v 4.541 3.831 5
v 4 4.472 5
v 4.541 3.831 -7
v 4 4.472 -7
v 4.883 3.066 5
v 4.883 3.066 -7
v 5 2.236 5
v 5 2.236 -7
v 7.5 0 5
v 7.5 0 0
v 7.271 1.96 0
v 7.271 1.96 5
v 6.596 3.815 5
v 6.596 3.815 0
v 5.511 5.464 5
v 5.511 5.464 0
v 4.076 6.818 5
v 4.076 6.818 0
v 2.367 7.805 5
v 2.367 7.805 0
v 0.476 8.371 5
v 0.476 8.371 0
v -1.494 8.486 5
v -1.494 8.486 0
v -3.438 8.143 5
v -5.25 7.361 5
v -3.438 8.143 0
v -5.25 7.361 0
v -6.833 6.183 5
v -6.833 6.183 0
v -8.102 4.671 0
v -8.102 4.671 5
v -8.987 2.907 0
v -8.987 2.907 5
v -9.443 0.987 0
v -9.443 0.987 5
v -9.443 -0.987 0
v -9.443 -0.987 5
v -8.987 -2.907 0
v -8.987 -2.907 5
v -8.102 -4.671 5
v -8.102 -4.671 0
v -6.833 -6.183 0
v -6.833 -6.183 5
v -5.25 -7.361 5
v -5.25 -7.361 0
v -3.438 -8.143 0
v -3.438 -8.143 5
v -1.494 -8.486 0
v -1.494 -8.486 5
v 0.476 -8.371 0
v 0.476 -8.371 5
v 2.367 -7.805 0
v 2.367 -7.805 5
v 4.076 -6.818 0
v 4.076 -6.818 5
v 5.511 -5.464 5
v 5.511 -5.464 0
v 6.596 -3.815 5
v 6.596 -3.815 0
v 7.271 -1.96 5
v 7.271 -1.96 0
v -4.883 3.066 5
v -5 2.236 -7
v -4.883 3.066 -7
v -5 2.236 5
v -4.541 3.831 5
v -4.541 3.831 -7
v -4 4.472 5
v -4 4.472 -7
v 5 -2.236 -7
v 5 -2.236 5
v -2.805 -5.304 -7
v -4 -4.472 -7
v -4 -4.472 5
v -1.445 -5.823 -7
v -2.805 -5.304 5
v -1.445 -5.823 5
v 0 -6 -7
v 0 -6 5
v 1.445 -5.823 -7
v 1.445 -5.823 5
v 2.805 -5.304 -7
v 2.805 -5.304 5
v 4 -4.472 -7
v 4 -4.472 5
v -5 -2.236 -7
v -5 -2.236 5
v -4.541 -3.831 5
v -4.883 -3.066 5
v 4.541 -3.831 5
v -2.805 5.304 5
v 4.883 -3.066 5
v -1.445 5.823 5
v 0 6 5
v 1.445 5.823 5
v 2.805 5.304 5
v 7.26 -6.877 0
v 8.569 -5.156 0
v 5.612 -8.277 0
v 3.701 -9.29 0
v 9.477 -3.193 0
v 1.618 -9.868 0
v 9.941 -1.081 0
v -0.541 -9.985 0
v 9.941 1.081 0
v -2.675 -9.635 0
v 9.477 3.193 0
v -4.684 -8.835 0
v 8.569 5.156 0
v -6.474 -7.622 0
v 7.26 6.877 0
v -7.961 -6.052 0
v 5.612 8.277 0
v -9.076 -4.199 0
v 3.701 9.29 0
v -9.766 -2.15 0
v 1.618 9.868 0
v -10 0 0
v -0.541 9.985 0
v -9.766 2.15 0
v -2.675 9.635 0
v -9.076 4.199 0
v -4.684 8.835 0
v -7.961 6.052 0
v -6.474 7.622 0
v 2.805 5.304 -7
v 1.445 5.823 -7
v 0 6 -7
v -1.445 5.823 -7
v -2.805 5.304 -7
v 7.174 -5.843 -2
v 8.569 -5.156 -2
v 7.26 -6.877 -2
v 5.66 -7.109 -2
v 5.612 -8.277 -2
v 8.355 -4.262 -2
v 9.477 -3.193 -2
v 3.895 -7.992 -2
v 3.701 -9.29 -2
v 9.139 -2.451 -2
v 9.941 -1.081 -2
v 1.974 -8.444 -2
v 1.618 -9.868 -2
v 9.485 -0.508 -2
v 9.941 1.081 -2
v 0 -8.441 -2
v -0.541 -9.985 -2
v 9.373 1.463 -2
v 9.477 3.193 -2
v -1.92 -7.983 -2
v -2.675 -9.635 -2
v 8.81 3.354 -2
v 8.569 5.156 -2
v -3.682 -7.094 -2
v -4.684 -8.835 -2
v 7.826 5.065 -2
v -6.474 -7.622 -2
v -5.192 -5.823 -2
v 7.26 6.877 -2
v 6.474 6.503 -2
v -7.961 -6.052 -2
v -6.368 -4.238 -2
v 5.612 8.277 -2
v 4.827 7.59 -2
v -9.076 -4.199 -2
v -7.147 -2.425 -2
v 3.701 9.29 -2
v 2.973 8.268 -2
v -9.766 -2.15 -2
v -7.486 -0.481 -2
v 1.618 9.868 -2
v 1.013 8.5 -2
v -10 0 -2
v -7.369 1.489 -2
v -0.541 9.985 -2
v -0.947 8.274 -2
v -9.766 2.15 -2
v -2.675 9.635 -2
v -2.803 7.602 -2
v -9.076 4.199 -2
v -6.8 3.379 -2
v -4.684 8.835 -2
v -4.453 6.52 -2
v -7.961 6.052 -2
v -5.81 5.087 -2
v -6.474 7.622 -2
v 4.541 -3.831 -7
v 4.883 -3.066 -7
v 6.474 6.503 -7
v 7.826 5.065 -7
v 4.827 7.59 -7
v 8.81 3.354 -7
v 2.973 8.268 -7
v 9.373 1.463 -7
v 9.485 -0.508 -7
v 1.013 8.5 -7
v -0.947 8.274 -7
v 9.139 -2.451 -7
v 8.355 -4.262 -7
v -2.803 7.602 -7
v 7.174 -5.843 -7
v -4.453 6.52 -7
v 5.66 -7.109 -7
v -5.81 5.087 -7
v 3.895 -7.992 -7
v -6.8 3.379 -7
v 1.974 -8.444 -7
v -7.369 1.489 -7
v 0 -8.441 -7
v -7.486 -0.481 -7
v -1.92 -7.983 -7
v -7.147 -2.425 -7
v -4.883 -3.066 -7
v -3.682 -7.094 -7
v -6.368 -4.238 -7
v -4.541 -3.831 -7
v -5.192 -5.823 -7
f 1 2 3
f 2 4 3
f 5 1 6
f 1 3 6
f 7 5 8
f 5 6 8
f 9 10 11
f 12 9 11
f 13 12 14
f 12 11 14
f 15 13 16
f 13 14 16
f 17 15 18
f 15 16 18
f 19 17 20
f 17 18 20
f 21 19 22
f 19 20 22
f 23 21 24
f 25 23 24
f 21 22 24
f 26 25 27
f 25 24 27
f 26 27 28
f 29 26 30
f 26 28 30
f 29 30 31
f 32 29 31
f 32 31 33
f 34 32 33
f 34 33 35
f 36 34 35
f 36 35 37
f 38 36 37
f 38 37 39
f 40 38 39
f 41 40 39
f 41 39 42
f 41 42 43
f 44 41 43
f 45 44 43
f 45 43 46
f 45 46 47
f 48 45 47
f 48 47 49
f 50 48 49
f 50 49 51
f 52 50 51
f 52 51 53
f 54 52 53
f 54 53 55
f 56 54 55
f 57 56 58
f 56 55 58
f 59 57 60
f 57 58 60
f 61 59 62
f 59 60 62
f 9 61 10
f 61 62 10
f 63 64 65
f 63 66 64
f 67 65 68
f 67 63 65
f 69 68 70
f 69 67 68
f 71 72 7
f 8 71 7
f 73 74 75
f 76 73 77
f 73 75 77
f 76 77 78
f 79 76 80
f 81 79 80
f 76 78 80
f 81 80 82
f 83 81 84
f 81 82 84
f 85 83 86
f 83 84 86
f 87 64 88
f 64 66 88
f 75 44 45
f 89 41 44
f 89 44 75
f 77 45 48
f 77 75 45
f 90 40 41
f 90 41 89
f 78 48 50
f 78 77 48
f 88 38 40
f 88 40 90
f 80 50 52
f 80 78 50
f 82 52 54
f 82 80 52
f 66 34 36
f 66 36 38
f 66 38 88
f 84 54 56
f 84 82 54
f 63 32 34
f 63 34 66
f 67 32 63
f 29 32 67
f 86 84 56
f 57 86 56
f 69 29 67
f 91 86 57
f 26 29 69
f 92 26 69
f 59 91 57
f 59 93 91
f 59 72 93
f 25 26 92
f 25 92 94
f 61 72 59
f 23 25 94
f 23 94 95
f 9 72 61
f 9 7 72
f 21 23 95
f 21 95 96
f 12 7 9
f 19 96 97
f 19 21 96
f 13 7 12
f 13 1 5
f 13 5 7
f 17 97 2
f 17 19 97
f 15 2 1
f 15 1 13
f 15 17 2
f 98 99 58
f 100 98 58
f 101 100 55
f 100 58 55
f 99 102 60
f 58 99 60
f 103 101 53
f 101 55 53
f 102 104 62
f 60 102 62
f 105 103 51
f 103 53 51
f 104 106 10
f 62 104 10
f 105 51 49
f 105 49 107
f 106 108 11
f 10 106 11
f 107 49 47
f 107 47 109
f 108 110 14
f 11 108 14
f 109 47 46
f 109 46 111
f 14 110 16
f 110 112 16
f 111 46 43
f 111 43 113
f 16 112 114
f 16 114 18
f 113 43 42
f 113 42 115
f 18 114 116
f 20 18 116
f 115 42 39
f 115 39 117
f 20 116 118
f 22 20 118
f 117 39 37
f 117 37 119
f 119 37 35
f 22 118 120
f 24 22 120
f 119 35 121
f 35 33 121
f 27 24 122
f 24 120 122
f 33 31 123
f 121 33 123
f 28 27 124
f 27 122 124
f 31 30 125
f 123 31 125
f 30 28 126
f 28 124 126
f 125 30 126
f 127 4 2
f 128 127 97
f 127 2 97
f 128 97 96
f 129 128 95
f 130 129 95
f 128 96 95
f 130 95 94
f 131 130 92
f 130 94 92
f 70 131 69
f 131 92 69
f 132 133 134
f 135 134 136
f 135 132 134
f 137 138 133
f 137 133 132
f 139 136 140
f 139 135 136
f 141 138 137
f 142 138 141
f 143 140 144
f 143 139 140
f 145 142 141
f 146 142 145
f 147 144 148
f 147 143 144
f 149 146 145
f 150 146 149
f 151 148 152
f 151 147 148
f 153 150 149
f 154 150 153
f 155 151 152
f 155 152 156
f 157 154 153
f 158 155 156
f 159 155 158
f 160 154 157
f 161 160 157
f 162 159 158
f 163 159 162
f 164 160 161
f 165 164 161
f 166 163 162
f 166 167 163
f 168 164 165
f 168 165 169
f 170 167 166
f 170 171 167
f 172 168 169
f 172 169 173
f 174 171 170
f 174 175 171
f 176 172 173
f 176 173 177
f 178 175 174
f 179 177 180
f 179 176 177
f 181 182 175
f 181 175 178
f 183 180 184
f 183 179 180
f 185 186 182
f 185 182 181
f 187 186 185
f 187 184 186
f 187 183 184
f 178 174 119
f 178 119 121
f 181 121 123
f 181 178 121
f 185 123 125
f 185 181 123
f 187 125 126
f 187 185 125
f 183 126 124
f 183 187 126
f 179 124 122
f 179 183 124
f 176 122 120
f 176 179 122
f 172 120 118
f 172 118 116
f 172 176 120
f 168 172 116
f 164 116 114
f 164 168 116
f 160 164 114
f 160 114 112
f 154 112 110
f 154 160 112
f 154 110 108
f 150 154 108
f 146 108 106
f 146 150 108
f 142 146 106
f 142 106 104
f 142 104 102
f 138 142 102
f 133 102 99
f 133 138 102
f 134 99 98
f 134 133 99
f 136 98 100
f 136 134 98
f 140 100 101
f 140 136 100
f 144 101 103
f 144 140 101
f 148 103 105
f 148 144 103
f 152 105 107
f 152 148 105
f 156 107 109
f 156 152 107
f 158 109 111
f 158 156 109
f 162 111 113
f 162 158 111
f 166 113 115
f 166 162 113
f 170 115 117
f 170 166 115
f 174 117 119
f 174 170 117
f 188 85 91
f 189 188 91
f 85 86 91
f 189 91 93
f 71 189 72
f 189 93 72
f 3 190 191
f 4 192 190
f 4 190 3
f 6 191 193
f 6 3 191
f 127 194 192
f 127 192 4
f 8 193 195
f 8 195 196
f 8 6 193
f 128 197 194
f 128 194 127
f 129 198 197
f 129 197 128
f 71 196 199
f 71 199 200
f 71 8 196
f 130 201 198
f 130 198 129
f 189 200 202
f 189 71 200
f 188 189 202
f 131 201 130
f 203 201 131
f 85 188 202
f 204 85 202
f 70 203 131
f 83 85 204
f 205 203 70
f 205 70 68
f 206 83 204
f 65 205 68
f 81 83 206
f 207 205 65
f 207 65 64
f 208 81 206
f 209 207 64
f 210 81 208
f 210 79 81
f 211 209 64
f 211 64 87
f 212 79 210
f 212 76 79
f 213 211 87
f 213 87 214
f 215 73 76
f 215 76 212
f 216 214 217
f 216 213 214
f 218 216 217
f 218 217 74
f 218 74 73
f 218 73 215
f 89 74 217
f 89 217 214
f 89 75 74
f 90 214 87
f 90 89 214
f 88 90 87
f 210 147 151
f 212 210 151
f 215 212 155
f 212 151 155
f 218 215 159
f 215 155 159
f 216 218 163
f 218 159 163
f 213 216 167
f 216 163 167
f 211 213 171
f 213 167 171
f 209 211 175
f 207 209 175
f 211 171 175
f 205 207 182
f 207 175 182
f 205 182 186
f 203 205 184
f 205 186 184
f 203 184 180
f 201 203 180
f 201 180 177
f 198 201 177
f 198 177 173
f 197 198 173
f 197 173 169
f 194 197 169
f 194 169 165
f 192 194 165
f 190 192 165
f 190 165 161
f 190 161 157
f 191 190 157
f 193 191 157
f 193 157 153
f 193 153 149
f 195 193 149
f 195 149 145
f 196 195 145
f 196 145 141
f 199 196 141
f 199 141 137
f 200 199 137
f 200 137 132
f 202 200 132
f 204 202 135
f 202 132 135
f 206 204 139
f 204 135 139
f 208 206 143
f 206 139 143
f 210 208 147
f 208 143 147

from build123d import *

# Parameters (mm, degrees)
SKETCH1_R           = 8.5
BOSS_EXTRUDE1_DEPTH = 5
SKETCH2_R           = 8.5
BOSS_EXTRUDE2_DEPTH = 7
CUT_EXTRUDE1_DEPTH  = 15.543039572
BOSS_EXTRUDE3_START = 2
SKETCH4_R           = 10
BOSS_EXTRUDE3_DEPTH = 2
FILLET2_R           = 3


with BuildPart() as part:
    # Sketch1 → Boss-Extrude1 (new body)
    with BuildSketch(Plane.XY):
        with Locations((-1, 0)):
            Circle(SKETCH1_R)
        with BuildLine():
            Line((5, -3.31662479), (5, 3.31662479))
            ThreePointArc((5, 3.31662479), (0, 6), (-5, 3.31662479))
            Line((-5, 3.31662479), (-5, -3.31662479))
            ThreePointArc((-5, -3.31662479), (0, -6), (5, -3.31662479))
        make_face(mode=Mode.SUBTRACT)
    extrude(amount=BOSS_EXTRUDE1_DEPTH)

    # Sketch2 → Boss-Extrude2 (add)
    with BuildSketch(Plane(origin=(0, 0, 0), x_dir=(-1, 0, 0), z_dir=(0, 0, -1))):
        with Locations((-1, 0)):
            Circle(SKETCH2_R)
    extrude(amount=BOSS_EXTRUDE2_DEPTH)

    # Sketch3 → Cut-Extrude1 (cut, through all)
    with BuildSketch(Plane.XY):
        with BuildLine():
            Line((5, -3.31662479), (5, 3.31662479))
            ThreePointArc((5, 3.31662479), (0, 6), (-5, 3.31662479))
            Line((-5, 3.31662479), (-5, -3.31662479))
            ThreePointArc((-5, -3.31662479), (0, -6), (5, -3.31662479))
        make_face()
    extrude(amount=-CUT_EXTRUDE1_DEPTH, mode=Mode.SUBTRACT)

    # Sketch4 → Boss-Extrude3 (add)
    with BuildSketch(Plane(origin=(0, 0, 0), x_dir=(-1, 0, 0), z_dir=(0, 0, -1)).offset(BOSS_EXTRUDE3_START)):
        Circle(SKETCH4_R)
        with BuildLine():
            Line((5, 3.31662479), (5, -3.31662479))
            ThreePointArc((5, -3.31662479), (0, -6), (-5, -3.31662479))
            Line((-5, -3.31662479), (-5, 3.31662479))
            ThreePointArc((-5, 3.31662479), (0, 6), (5, 3.31662479))
        make_face(mode=Mode.SUBTRACT)
    extrude(amount=-BOSS_EXTRUDE3_DEPTH)

    # Fillet2
    fillet2_edges = [part.edges().sort_by_distance(p)[0] for p in [
        (5, 3.31662479, -1),
        (5, -3.31662479, -1),
        (-5, -3.31662479, -1),
        (-5, 3.31662479, -1),
    ]]
    fillet(fillet2_edges, radius=FILLET2_R)


solid = part.part
